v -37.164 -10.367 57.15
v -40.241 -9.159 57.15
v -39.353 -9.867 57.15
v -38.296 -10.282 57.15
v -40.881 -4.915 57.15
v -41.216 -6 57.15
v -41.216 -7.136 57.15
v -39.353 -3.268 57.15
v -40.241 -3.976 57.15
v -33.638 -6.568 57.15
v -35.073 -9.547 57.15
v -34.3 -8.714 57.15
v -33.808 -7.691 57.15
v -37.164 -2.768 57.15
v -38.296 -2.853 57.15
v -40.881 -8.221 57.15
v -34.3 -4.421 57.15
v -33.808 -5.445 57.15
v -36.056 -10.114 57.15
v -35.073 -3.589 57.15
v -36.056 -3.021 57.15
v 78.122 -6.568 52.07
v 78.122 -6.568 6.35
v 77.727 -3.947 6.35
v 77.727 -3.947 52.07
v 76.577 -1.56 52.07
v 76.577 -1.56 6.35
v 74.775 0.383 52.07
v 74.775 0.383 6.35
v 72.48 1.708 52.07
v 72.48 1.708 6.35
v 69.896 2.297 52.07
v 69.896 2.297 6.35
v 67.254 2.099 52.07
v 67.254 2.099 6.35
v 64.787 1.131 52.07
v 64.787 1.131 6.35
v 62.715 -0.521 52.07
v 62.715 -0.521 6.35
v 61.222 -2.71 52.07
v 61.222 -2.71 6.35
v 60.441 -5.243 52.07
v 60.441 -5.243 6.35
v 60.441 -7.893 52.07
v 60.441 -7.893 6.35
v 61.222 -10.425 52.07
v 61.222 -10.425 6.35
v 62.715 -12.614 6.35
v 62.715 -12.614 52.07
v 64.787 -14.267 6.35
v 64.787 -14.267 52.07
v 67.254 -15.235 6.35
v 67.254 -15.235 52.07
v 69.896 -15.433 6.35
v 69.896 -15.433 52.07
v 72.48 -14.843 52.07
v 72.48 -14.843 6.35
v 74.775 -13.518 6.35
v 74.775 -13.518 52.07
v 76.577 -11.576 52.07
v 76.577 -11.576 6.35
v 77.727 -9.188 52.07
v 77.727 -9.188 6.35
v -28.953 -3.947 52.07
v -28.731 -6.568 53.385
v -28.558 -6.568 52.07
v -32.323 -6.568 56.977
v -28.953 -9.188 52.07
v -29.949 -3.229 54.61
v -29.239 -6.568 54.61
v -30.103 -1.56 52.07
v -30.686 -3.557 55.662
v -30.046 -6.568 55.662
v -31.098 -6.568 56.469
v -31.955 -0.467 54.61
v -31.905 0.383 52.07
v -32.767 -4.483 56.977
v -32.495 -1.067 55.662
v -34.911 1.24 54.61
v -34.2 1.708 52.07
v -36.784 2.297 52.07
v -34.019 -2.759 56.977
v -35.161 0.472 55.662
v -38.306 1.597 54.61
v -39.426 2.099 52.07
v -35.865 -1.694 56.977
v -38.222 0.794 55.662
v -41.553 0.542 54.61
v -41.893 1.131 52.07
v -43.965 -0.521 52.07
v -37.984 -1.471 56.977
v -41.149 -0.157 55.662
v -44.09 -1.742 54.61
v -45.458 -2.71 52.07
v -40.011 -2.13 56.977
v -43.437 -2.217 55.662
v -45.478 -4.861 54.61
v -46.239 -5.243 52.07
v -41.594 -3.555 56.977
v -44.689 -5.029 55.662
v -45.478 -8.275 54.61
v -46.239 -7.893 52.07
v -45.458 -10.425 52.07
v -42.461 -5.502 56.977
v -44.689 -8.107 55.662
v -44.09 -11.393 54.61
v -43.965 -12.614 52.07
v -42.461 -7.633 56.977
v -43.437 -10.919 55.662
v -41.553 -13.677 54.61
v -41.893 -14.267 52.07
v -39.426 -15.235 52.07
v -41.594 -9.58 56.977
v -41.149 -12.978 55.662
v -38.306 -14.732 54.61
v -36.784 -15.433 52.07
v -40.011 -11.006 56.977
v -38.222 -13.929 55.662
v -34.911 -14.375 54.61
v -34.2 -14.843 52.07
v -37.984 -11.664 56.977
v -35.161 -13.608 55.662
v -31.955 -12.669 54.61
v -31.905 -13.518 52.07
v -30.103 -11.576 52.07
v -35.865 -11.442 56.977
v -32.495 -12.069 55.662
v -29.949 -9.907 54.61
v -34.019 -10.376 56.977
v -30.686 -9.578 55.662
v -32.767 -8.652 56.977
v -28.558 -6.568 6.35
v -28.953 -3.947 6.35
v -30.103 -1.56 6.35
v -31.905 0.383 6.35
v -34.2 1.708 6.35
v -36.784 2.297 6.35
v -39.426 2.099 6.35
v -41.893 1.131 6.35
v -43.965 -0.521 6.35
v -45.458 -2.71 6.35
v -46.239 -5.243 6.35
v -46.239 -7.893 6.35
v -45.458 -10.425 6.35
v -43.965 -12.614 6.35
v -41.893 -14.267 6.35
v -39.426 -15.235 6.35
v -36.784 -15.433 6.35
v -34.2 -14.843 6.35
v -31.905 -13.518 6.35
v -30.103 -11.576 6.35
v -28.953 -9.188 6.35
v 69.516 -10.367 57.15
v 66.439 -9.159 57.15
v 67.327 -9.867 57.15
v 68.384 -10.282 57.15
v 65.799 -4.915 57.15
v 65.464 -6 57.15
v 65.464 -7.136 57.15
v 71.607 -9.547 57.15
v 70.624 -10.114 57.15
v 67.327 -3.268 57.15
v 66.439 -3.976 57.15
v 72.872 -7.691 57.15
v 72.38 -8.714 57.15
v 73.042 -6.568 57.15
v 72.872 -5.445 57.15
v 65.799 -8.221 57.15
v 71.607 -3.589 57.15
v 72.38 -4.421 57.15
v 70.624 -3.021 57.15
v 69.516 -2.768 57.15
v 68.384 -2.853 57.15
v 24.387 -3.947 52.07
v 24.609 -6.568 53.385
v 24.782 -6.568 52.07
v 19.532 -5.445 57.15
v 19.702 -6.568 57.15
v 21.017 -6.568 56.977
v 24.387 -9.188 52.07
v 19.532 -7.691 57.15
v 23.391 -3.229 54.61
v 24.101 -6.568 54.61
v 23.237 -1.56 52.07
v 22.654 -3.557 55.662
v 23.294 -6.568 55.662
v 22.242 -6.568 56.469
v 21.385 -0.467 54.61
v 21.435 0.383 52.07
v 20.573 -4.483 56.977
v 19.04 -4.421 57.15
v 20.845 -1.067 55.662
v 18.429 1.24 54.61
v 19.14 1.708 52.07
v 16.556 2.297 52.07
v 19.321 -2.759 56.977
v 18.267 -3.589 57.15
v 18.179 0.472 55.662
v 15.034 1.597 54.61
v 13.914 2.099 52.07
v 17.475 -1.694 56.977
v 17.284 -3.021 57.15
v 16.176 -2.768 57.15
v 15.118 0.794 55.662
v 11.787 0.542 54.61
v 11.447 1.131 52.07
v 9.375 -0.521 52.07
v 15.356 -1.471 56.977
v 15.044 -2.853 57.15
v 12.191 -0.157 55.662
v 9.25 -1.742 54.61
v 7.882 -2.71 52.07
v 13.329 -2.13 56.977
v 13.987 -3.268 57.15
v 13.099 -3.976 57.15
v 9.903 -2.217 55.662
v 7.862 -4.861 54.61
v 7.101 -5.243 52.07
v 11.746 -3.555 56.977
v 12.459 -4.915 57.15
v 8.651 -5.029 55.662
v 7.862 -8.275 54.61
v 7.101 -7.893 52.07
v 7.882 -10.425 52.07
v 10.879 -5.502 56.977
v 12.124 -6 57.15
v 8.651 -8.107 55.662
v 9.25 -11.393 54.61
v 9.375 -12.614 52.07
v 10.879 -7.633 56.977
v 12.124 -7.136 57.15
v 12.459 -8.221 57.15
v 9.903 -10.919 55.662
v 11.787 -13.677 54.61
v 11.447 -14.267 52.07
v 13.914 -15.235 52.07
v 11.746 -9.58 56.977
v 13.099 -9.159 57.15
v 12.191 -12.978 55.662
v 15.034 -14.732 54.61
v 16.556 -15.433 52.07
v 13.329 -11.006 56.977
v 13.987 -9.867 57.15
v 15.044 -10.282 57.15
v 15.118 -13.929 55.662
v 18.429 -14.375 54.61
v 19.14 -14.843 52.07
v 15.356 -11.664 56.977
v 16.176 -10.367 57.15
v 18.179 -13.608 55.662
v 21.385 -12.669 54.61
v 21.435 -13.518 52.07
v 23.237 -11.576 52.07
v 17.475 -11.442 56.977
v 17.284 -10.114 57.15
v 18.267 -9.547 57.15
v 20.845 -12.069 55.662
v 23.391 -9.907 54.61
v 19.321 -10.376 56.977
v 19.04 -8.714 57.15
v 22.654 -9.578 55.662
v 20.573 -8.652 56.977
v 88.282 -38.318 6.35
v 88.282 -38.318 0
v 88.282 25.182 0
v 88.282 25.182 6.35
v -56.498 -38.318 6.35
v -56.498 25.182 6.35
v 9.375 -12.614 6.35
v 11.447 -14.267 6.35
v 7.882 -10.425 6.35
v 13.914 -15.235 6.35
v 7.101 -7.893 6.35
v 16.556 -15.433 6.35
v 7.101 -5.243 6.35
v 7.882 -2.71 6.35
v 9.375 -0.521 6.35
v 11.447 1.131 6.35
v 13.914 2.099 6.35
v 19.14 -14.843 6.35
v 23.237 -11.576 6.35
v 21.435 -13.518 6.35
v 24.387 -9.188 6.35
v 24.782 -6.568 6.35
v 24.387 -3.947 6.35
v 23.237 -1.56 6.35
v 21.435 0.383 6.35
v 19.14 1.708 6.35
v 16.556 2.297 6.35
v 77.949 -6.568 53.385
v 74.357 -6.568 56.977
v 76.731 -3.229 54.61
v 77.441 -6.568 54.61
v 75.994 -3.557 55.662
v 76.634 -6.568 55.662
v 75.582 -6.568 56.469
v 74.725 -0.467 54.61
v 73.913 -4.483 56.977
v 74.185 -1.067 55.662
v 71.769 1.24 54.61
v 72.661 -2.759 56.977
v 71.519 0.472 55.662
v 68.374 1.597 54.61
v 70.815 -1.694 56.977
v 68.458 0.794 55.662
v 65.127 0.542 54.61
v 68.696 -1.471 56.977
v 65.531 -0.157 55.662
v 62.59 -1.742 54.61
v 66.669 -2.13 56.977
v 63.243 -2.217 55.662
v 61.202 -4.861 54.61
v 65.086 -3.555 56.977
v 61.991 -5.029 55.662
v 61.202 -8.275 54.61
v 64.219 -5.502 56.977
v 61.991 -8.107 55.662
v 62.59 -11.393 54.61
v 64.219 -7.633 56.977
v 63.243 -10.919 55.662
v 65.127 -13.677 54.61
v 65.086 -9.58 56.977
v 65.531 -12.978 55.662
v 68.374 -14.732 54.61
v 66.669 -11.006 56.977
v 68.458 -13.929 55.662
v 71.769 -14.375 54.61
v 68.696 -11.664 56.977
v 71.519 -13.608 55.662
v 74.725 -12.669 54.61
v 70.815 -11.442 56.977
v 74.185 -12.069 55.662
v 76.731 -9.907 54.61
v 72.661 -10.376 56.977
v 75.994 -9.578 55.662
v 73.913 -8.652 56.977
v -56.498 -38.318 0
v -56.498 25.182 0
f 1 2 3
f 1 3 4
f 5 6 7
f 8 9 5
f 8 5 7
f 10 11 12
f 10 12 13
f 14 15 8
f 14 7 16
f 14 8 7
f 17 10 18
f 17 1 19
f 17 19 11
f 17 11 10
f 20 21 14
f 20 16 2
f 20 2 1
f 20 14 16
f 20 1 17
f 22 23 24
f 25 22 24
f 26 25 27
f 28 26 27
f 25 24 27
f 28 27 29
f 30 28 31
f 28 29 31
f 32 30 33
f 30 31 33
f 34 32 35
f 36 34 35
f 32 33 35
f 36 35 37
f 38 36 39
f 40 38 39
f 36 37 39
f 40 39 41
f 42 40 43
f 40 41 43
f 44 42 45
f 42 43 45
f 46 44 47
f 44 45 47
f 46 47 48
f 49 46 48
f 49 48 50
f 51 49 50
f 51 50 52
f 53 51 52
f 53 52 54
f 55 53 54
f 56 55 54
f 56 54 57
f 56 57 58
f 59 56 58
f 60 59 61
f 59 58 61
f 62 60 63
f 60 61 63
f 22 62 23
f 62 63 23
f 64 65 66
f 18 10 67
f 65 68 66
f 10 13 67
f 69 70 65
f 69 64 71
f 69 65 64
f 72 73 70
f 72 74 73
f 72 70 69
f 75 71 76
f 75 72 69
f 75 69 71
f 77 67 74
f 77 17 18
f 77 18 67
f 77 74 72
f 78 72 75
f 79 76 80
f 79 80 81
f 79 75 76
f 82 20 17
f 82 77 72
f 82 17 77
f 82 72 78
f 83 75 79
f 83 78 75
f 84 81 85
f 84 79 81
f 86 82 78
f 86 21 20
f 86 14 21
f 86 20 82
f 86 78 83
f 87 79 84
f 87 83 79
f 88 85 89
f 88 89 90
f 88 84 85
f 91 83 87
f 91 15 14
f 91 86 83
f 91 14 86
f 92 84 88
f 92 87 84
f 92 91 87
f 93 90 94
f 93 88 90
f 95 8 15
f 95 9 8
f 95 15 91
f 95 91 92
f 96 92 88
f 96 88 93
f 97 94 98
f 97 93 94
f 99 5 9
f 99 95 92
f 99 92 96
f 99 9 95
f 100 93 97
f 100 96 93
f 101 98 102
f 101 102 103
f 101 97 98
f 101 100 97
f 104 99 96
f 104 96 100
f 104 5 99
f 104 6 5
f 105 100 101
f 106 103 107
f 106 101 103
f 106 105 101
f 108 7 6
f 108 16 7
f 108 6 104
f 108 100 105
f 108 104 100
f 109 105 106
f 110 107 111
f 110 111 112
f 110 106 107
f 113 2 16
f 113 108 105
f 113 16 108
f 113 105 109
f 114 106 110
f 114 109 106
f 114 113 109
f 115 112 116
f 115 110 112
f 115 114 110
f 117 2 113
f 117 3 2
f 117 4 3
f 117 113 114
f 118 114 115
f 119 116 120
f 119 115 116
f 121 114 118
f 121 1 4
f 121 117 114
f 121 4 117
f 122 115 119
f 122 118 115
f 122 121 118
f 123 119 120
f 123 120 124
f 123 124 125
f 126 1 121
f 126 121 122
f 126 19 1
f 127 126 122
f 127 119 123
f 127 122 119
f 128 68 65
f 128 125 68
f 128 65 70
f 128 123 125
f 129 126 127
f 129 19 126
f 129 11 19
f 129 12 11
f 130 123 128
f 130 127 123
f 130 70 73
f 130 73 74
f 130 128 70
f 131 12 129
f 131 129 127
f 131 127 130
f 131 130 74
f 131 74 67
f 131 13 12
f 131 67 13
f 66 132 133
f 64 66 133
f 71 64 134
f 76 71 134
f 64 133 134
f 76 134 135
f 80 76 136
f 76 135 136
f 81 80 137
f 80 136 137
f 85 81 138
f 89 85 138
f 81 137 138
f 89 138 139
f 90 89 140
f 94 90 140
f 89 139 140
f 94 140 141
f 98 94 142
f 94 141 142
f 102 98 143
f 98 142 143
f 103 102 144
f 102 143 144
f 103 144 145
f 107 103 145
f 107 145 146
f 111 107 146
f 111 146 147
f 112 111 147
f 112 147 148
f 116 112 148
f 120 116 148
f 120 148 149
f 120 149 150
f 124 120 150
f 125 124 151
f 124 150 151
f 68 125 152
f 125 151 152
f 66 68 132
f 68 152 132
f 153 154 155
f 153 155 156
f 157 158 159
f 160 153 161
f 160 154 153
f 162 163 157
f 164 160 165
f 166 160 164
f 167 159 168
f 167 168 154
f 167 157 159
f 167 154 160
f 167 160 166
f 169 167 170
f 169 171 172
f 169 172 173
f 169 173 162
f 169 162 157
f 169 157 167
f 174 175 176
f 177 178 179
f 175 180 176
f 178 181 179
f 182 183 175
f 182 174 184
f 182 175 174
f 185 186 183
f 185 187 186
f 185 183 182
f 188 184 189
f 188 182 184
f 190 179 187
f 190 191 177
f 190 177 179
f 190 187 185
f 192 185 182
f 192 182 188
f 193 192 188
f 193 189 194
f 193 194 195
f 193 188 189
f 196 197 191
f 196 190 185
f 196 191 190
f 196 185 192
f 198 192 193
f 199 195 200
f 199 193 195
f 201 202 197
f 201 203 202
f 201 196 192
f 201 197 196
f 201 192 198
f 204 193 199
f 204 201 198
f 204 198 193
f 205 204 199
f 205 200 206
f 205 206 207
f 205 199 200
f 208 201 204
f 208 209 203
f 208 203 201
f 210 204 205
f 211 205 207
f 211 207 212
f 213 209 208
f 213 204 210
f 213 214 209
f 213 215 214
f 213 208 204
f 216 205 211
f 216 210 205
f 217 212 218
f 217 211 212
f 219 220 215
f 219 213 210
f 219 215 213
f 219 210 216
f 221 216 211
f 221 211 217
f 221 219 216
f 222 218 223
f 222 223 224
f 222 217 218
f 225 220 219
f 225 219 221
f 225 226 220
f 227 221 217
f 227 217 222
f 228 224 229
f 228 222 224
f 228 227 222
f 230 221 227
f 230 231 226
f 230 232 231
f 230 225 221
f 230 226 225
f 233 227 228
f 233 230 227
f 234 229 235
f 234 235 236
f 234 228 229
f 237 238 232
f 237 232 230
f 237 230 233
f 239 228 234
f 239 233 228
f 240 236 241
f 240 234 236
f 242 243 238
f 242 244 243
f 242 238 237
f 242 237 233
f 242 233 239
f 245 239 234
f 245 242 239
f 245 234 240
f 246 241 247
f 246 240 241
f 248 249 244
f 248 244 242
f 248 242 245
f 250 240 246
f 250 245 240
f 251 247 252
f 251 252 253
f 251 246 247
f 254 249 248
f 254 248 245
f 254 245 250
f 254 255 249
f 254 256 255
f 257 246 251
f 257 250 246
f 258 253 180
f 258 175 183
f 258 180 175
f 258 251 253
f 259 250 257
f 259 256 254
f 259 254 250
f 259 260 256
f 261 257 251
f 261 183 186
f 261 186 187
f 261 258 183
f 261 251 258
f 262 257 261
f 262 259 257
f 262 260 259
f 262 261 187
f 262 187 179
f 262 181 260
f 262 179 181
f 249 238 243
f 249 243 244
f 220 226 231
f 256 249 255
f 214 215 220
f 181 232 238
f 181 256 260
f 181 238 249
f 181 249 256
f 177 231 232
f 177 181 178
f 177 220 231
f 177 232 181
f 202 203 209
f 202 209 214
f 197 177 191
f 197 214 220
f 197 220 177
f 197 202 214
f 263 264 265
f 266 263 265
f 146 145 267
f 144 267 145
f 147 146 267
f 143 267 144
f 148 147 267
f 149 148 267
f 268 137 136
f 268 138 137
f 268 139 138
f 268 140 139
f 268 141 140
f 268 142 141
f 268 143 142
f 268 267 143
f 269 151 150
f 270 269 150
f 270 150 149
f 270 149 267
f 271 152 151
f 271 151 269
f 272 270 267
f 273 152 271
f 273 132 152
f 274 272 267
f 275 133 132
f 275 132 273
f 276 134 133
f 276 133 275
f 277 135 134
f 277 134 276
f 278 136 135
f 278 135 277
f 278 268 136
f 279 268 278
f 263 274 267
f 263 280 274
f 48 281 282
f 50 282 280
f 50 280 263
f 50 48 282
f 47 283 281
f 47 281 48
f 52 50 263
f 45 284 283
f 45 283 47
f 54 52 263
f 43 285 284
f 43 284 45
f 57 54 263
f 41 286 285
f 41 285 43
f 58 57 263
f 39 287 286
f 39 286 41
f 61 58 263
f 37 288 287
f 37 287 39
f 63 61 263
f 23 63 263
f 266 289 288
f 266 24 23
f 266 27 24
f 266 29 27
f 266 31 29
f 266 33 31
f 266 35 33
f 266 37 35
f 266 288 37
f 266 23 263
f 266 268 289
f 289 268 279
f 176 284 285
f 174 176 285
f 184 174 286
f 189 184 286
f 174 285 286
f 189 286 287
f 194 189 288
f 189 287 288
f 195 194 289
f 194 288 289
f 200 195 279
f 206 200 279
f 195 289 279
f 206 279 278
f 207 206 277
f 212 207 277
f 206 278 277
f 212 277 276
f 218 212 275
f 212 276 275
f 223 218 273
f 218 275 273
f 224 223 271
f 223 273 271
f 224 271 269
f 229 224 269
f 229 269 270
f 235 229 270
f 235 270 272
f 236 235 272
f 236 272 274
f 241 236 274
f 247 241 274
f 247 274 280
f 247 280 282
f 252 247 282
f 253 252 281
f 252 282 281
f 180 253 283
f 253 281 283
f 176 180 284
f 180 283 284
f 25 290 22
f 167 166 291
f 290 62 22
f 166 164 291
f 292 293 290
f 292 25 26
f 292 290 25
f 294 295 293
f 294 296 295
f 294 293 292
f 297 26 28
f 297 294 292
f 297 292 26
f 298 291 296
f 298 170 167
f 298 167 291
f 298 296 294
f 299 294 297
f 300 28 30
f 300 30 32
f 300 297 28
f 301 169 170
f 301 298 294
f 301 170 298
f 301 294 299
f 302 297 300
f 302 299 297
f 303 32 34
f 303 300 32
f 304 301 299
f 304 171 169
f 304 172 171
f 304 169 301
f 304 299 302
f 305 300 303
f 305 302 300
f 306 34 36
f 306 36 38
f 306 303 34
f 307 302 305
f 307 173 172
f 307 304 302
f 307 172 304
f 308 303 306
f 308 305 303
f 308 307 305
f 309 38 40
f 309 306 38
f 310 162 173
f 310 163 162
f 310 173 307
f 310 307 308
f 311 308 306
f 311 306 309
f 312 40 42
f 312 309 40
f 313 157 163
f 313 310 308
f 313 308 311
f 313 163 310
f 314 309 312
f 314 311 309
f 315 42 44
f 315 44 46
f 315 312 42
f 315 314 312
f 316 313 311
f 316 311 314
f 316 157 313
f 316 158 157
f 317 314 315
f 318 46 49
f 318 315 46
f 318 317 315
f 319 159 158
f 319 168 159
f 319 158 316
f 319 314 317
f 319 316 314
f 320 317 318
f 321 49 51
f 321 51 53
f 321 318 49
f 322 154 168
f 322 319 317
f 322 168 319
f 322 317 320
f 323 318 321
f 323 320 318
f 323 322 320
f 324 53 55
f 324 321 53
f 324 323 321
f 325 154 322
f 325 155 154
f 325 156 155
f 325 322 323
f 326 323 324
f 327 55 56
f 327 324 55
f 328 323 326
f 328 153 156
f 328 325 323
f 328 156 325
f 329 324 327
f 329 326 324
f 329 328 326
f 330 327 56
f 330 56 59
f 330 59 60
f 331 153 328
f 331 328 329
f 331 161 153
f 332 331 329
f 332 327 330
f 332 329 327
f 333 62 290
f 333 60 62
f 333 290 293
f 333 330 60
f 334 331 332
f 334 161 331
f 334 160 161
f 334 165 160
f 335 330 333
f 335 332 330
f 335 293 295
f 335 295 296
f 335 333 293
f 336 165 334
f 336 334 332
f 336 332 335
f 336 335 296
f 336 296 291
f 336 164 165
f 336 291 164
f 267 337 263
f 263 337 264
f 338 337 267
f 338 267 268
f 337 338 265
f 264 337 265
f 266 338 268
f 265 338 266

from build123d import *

# Parameters (mm, degrees)
F0_W     = 144.78
F0_H     = 63.5
F1_DEPTH = 6.35
F2_R     = 8.89
F3_DEPTH = 50.8
F4_R     = 5.08


with BuildPart() as f1:
    # F0 (on Top) → F1 (new body)
    with BuildSketch(Plane.XY):
        with Locations((15.891719, -6.567724)):
            Rectangle(F0_W, F0_H)
    extrude(amount=F1_DEPTH)

    # F2 (on face) → F3 (join)
    with BuildSketch(Plane.XY.offset(6.35)):
        with Locations((-37.448281, -6.567724)):
            Circle(F2_R)
        with Locations((15.891719, -6.567724)):
            Circle(F2_R)
        with Locations((69.231719, -6.567724)):
            Circle(F2_R)
    extrude(amount=F3_DEPTH)

    # F4
    f4_edges = [f1.edges().sort_by_distance(p)[0] for p in [
        (60.341719, -6.567724, 57.15),
        (7.001719, -6.567724, 57.15),
        (-46.338281, -6.567724, 57.15),
    ]]
    fillet(f4_edges, radius=F4_R)


solid = f1.part
